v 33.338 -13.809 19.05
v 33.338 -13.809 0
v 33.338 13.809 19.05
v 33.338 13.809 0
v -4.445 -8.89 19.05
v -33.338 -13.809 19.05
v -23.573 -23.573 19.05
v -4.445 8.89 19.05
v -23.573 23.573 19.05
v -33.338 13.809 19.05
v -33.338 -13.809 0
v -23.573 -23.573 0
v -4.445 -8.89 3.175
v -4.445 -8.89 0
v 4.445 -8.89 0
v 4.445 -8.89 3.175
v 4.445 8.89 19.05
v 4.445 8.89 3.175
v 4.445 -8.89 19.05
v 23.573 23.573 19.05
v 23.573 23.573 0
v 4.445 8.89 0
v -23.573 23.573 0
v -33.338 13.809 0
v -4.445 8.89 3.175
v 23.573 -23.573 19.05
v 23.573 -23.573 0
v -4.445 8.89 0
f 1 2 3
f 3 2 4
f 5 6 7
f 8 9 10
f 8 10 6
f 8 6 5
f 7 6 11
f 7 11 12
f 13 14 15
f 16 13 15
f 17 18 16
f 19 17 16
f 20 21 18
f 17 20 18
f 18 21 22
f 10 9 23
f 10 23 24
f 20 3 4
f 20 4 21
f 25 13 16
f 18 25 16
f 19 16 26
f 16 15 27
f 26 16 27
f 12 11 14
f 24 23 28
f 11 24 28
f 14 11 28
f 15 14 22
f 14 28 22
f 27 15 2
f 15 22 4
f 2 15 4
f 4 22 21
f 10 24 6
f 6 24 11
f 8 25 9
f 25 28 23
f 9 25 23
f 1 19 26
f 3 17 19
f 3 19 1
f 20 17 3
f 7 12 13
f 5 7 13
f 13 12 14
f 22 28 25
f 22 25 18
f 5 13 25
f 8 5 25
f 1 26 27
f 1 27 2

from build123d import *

# Parameters (mm, degrees)
F1_DEPTH = 19.05
F0_W     = 8.89
F0_H     = 17.78
F2_DEPTH = 3.175


with BuildPart() as f1:
    # F0 (on Top) → F1 (new body)
    with BuildSketch(Plane.XY):
        Polygon((23.5731723178, -23.5731723178), (33.3375, -13.8088446356), (33.3375, 13.8088446356), (23.5731723178, 23.5731723178), (4.445, 8.89), (4.445, -8.89), align=None)
    extrude(amount=F1_DEPTH)



with BuildPart() as f1b:
    # F0 (on Top) → F1, piece 2 (new body)
    with BuildSketch(Plane.XY):
        Polygon((-23.5731723178, -23.5731723178), (-4.445, -8.89), (-4.445, 8.89), (-23.5731723178, 23.5731723178), (-33.3375, 13.8088446356), (-33.3375, -13.8088446356), align=None)
    extrude(amount=F1_DEPTH)


with BuildPart() as f1_1:
    add(f1.part)

    add(f1b.part)  # F2 merges F1b
    # F0 (on Top) → F2 (join)
    with BuildSketch(Plane.XY):
        Rectangle(F0_W, F0_H)
    extrude(amount=F2_DEPTH)


solid = f1_1.part
